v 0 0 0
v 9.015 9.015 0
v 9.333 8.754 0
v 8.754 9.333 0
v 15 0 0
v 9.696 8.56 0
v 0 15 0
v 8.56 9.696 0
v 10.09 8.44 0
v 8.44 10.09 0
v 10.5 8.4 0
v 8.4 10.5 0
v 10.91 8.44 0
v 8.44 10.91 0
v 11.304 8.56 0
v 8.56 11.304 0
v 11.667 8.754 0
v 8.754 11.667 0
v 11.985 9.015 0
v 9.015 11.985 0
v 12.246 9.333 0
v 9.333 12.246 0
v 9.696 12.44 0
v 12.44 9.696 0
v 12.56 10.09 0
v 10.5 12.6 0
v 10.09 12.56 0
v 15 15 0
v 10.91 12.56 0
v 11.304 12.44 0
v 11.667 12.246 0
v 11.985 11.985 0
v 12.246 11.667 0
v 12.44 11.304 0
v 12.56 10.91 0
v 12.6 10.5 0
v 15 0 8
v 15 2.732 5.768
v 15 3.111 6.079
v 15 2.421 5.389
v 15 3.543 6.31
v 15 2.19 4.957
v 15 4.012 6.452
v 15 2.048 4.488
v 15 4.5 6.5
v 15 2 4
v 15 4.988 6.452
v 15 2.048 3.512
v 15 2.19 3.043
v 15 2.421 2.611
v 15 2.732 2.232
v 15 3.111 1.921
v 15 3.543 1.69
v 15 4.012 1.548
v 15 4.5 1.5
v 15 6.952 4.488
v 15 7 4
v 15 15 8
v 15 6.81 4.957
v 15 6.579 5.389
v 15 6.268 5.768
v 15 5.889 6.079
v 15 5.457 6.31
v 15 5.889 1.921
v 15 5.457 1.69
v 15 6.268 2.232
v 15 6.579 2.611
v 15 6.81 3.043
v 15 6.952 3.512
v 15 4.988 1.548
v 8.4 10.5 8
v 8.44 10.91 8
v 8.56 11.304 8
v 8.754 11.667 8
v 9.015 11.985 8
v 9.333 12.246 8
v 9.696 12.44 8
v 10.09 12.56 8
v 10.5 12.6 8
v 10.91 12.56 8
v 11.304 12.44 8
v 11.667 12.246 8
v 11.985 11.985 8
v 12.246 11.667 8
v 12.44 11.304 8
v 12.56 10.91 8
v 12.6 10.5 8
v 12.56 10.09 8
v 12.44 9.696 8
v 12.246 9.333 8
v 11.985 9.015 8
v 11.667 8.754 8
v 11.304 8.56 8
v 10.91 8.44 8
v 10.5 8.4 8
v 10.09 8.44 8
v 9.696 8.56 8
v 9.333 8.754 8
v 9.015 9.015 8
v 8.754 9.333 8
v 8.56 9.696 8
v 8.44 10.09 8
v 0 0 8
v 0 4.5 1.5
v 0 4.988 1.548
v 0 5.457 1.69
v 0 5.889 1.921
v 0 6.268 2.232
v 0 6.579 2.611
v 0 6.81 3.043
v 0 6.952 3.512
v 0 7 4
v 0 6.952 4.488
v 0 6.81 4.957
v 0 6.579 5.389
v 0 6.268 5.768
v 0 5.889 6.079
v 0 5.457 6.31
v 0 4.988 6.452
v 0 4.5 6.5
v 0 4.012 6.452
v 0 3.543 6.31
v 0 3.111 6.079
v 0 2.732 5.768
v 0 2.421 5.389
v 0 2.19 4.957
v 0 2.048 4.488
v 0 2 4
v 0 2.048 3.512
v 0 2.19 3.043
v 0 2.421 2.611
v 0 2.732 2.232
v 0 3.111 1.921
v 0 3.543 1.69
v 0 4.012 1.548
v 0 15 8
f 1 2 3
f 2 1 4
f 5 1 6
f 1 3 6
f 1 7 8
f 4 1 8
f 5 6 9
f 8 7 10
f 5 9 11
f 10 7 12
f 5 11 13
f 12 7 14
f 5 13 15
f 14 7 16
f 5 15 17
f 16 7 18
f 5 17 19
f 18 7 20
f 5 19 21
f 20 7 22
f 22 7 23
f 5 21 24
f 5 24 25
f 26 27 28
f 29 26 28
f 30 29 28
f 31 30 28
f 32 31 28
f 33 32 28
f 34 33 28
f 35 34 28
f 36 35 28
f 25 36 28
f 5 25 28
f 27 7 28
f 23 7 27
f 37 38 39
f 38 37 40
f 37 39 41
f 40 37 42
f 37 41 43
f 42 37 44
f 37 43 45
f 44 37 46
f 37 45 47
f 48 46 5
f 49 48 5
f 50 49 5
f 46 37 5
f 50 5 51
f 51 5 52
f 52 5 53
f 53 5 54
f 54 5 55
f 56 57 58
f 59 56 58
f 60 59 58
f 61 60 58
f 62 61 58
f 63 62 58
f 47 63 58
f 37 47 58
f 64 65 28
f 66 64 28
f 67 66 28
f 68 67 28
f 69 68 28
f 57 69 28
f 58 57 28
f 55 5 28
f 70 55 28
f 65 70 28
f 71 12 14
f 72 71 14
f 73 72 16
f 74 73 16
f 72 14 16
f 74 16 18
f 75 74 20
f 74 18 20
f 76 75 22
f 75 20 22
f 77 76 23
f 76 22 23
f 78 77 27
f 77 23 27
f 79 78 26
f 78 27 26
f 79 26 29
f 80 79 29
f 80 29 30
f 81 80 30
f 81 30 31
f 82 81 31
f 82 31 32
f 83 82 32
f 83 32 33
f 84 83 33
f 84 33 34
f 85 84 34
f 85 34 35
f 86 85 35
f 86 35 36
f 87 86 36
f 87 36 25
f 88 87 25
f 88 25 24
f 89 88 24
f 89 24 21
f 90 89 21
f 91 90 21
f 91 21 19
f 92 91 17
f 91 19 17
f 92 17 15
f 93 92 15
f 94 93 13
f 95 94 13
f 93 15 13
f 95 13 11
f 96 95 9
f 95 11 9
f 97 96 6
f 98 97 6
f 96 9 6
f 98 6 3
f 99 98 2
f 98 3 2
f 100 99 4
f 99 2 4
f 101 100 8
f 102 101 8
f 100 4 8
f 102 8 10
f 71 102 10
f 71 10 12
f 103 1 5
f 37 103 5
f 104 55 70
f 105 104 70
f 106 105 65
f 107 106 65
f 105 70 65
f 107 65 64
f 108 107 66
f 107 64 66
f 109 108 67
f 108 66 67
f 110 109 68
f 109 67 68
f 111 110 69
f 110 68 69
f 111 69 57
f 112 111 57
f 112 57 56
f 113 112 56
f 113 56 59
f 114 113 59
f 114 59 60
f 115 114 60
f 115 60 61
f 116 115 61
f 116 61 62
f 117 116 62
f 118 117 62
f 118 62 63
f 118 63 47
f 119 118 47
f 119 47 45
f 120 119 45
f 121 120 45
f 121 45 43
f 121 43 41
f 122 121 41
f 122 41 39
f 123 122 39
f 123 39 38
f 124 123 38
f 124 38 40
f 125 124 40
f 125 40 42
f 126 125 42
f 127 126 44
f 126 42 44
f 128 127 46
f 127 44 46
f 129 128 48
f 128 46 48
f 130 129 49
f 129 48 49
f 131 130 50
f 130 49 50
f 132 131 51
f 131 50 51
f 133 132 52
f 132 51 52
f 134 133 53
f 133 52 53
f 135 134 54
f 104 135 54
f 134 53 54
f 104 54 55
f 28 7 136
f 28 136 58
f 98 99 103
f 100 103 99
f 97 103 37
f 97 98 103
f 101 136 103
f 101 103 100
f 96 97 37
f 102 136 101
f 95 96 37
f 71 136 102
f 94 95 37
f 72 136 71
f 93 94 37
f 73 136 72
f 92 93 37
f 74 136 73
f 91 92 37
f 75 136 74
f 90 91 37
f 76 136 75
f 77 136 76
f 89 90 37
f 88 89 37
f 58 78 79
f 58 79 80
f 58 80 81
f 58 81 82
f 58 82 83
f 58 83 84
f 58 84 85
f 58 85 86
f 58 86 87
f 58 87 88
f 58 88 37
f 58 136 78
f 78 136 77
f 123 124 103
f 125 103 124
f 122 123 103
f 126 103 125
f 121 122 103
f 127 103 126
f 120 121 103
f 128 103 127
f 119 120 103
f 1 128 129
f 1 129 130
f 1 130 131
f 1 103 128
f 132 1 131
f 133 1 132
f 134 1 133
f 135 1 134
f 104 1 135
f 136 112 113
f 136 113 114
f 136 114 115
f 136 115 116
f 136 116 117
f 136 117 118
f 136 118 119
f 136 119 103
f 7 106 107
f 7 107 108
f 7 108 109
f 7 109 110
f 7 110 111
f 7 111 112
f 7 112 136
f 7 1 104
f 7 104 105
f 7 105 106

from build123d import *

# Parameters (mm, degrees)
SKETCH1_W                   = 15
SKETCH1_H                   = 15
BOSS_EXTRUDE1_DEPTH         = 8
TAP_DRILL_FOR_M5X0_8_TAP1_D = 4.2
F_5_0_5_DIAMETER_HOLE1_D    = 5


with BuildPart() as part:
    # Sketch1 → Boss-Extrude1 (new body)
    with BuildSketch(Plane.XY):
        with Locations((7.5, 7.5)):
            Rectangle(SKETCH1_W, SKETCH1_H)
    extrude(amount=BOSS_EXTRUDE1_DEPTH)

    # Tap Drill for M5x0.8 Tap1 (through all)
    with Locations(Plane.XY.offset(8)):
        with Locations((10.5, 10.5)):
            Hole(TAP_DRILL_FOR_M5X0_8_TAP1_D / 2)

    # Ø5.0 (5) Diameter Hole1 (through all)
    with Locations(Plane.ZY):
        with Locations((4, 4.5)):
            Hole(F_5_0_5_DIAMETER_HOLE1_D / 2)


solid = part.part
